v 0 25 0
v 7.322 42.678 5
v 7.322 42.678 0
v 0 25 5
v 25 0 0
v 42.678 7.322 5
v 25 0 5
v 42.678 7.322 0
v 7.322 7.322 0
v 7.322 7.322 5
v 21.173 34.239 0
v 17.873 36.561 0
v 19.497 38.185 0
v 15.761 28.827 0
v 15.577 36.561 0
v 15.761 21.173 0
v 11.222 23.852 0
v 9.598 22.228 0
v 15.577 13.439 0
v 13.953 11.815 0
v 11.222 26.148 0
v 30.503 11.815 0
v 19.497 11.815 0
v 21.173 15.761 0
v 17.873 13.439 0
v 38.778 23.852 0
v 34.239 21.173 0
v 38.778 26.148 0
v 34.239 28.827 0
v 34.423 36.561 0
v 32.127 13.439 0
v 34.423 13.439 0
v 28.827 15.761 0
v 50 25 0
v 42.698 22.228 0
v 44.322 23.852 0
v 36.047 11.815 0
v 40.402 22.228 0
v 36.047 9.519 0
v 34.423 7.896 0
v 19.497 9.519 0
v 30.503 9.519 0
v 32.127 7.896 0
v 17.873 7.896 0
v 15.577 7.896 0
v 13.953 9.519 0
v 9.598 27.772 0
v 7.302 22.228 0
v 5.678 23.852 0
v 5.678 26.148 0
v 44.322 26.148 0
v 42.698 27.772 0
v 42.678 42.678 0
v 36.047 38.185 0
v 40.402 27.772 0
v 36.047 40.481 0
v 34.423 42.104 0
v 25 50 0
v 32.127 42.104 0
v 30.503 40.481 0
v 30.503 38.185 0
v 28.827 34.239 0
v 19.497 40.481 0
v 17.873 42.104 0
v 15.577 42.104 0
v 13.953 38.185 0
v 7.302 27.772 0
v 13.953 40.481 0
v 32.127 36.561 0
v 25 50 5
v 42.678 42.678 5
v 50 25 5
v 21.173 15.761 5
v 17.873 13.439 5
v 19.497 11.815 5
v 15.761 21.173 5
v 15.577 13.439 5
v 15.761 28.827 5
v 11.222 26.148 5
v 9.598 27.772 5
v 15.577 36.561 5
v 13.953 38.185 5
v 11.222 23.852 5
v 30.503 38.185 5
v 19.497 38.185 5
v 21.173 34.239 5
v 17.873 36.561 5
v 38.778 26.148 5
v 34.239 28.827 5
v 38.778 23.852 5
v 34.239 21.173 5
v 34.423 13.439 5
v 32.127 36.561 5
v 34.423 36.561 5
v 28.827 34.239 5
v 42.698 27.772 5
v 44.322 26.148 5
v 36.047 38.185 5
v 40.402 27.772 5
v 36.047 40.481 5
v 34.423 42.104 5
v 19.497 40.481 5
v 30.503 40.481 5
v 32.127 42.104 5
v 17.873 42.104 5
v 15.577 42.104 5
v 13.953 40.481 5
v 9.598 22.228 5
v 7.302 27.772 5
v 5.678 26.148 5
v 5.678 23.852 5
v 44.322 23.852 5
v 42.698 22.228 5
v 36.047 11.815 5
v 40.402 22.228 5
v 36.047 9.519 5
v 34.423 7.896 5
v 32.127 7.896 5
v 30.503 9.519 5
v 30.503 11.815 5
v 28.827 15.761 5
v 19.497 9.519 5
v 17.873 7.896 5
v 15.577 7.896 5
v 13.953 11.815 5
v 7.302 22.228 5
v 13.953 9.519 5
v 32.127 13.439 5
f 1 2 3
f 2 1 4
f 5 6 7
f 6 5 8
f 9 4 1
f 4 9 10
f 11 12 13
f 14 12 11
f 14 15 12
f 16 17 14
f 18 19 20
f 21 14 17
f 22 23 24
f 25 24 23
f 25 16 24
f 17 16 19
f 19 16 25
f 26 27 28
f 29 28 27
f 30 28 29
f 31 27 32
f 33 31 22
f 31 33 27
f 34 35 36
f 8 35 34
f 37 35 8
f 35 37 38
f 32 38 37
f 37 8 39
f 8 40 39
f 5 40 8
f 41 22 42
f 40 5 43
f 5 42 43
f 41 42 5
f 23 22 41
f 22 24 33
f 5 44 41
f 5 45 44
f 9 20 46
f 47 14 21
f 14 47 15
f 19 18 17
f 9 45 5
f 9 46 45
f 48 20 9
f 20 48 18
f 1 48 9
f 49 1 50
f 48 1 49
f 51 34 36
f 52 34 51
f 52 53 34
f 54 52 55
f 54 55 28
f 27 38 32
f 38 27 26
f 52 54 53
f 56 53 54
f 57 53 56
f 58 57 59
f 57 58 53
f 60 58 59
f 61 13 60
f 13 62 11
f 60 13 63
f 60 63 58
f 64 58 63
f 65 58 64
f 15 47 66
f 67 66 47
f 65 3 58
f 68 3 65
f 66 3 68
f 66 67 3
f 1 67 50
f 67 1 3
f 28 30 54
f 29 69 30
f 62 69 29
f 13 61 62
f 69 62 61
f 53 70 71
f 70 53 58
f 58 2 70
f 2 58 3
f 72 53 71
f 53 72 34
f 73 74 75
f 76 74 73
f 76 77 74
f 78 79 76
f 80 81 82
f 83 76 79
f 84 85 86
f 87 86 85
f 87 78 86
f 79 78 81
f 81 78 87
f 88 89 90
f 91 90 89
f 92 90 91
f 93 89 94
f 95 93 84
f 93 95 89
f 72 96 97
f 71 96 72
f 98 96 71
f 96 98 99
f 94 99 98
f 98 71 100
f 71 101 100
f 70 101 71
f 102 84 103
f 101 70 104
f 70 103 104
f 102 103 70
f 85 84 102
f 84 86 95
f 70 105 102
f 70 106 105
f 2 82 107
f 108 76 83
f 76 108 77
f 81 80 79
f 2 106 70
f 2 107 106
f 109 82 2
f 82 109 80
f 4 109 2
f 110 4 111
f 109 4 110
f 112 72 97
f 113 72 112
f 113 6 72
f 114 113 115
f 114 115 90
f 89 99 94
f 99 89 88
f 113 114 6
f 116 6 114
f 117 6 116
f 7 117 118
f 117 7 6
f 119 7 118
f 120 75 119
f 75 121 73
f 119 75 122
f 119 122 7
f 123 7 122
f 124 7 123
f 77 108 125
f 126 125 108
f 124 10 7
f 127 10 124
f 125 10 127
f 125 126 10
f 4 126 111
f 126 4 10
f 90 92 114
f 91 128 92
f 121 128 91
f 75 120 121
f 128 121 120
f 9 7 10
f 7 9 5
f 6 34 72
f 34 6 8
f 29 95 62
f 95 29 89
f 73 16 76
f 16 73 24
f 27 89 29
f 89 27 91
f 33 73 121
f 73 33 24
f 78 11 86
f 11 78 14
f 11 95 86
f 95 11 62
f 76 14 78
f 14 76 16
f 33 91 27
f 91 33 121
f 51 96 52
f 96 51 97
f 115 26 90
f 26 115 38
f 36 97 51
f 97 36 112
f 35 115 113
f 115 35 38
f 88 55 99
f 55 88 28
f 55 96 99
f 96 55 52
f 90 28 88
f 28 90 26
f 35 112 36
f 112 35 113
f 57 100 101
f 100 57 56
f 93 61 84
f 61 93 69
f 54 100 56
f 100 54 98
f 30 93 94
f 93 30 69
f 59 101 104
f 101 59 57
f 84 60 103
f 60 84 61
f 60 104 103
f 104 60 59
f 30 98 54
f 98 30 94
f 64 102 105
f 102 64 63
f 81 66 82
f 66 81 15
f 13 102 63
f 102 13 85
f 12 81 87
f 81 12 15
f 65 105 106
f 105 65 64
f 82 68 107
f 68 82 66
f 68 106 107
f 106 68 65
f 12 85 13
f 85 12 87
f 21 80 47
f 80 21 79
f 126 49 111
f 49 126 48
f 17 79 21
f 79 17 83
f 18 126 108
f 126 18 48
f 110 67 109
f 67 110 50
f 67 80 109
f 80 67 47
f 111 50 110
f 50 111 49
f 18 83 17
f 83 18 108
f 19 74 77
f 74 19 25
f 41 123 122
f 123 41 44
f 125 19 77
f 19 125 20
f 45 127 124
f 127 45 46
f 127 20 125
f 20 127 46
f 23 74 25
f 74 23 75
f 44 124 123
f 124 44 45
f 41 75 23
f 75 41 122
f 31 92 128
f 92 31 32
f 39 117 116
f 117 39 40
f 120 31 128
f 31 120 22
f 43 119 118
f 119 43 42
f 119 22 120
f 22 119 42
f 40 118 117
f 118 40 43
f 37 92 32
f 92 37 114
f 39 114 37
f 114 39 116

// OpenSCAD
$fn = 32;

// ----------------------------------------------------------------------
// Polygon plate: 8-gon R25, 6 bolt windows
// ----------------------------------------------------------------------

// --- parameters (mm) ---
sides = 8;                // number of polygon sides
plate_r = 25;             // circumscribed radius of the polygon
bore_r = 10;              // centre bore radius
bolts = 6;                // number of bolt windows
ring_r = 16.55;           // bolt-circle radius
bolt_r = 3;               // bolt window radius
plate_t = 5;              // plate thickness, Z (extrusion height)

plate_d = 2 * plate_r;  // circumscribed diameter
bore_d = 2 * bore_r;  // centre bore diameter
bolt_d = 2 * bolt_r;  // bolt window diameter
ring_d = 2 * ring_r;  // bolt-circle diameter

profile = [[50, 25], [42.678, 42.678], [25, 50], [7.322, 42.678], [0, 25], [7.322, 7.322], [25, 0], [42.678, 7.322]];  // primary outline, 8 points, counter clockwise
void_1 = [[34.239, 28.827], [28.827, 34.239], [21.173, 34.239], [15.761, 28.827], [15.761, 21.173], [21.173, 15.761], [28.827, 15.761], [34.239, 21.173]];  // centre bore, 8 points
void_2 = [[44.322, 26.148], [42.698, 27.772], [40.402, 27.772], [38.778, 26.148], [38.778, 23.852], [40.402, 22.228], [42.698, 22.228], [44.322, 23.852]];  // bolt window 1, 8 points
void_3 = [[36.047, 40.481], [34.423, 42.104], [32.127, 42.104], [30.503, 40.481], [30.503, 38.185], [32.127, 36.561], [34.423, 36.561], [36.047, 38.185]];  // bolt window 2, 8 points
void_4 = [[19.497, 40.481], [17.873, 42.104], [15.577, 42.104], [13.953, 40.481], [13.953, 38.185], [15.577, 36.561], [17.873, 36.561], [19.497, 38.185]];  // bolt window 3, 8 points
void_5 = [[11.222, 26.148], [9.598, 27.772], [7.302, 27.772], [5.678, 26.148], [5.678, 23.852], [7.302, 22.228], [9.598, 22.228], [11.222, 23.852]];  // bolt window 4, 8 points
void_6 = [[19.497, 11.815], [17.873, 13.439], [15.577, 13.439], [13.953, 11.815], [13.953, 9.519], [15.577, 7.896], [17.873, 7.896], [19.497, 9.519]];  // bolt window 5, 8 points
void_7 = [[36.047, 11.815], [34.423, 13.439], [32.127, 13.439], [30.503, 11.815], [30.503, 9.519], [32.127, 7.896], [34.423, 7.896], [36.047, 9.519]];  // bolt window 6, 8 points

// --- the one profile operation ---
difference() {
  linear_extrude(height = plate_t) polygon(points = profile);
  translate([0, 0, -1])
    linear_extrude(height = plate_t + 2) polygon(points = void_1);
  translate([0, 0, -1])
    linear_extrude(height = plate_t + 2) polygon(points = void_2);
  translate([0, 0, -1])
    linear_extrude(height = plate_t + 2) polygon(points = void_3);
  translate([0, 0, -1])
    linear_extrude(height = plate_t + 2) polygon(points = void_4);
  translate([0, 0, -1])
    linear_extrude(height = plate_t + 2) polygon(points = void_5);
  translate([0, 0, -1])
    linear_extrude(height = plate_t + 2) polygon(points = void_6);
  translate([0, 0, -1])
    linear_extrude(height = plate_t + 2) polygon(points = void_7);
}
